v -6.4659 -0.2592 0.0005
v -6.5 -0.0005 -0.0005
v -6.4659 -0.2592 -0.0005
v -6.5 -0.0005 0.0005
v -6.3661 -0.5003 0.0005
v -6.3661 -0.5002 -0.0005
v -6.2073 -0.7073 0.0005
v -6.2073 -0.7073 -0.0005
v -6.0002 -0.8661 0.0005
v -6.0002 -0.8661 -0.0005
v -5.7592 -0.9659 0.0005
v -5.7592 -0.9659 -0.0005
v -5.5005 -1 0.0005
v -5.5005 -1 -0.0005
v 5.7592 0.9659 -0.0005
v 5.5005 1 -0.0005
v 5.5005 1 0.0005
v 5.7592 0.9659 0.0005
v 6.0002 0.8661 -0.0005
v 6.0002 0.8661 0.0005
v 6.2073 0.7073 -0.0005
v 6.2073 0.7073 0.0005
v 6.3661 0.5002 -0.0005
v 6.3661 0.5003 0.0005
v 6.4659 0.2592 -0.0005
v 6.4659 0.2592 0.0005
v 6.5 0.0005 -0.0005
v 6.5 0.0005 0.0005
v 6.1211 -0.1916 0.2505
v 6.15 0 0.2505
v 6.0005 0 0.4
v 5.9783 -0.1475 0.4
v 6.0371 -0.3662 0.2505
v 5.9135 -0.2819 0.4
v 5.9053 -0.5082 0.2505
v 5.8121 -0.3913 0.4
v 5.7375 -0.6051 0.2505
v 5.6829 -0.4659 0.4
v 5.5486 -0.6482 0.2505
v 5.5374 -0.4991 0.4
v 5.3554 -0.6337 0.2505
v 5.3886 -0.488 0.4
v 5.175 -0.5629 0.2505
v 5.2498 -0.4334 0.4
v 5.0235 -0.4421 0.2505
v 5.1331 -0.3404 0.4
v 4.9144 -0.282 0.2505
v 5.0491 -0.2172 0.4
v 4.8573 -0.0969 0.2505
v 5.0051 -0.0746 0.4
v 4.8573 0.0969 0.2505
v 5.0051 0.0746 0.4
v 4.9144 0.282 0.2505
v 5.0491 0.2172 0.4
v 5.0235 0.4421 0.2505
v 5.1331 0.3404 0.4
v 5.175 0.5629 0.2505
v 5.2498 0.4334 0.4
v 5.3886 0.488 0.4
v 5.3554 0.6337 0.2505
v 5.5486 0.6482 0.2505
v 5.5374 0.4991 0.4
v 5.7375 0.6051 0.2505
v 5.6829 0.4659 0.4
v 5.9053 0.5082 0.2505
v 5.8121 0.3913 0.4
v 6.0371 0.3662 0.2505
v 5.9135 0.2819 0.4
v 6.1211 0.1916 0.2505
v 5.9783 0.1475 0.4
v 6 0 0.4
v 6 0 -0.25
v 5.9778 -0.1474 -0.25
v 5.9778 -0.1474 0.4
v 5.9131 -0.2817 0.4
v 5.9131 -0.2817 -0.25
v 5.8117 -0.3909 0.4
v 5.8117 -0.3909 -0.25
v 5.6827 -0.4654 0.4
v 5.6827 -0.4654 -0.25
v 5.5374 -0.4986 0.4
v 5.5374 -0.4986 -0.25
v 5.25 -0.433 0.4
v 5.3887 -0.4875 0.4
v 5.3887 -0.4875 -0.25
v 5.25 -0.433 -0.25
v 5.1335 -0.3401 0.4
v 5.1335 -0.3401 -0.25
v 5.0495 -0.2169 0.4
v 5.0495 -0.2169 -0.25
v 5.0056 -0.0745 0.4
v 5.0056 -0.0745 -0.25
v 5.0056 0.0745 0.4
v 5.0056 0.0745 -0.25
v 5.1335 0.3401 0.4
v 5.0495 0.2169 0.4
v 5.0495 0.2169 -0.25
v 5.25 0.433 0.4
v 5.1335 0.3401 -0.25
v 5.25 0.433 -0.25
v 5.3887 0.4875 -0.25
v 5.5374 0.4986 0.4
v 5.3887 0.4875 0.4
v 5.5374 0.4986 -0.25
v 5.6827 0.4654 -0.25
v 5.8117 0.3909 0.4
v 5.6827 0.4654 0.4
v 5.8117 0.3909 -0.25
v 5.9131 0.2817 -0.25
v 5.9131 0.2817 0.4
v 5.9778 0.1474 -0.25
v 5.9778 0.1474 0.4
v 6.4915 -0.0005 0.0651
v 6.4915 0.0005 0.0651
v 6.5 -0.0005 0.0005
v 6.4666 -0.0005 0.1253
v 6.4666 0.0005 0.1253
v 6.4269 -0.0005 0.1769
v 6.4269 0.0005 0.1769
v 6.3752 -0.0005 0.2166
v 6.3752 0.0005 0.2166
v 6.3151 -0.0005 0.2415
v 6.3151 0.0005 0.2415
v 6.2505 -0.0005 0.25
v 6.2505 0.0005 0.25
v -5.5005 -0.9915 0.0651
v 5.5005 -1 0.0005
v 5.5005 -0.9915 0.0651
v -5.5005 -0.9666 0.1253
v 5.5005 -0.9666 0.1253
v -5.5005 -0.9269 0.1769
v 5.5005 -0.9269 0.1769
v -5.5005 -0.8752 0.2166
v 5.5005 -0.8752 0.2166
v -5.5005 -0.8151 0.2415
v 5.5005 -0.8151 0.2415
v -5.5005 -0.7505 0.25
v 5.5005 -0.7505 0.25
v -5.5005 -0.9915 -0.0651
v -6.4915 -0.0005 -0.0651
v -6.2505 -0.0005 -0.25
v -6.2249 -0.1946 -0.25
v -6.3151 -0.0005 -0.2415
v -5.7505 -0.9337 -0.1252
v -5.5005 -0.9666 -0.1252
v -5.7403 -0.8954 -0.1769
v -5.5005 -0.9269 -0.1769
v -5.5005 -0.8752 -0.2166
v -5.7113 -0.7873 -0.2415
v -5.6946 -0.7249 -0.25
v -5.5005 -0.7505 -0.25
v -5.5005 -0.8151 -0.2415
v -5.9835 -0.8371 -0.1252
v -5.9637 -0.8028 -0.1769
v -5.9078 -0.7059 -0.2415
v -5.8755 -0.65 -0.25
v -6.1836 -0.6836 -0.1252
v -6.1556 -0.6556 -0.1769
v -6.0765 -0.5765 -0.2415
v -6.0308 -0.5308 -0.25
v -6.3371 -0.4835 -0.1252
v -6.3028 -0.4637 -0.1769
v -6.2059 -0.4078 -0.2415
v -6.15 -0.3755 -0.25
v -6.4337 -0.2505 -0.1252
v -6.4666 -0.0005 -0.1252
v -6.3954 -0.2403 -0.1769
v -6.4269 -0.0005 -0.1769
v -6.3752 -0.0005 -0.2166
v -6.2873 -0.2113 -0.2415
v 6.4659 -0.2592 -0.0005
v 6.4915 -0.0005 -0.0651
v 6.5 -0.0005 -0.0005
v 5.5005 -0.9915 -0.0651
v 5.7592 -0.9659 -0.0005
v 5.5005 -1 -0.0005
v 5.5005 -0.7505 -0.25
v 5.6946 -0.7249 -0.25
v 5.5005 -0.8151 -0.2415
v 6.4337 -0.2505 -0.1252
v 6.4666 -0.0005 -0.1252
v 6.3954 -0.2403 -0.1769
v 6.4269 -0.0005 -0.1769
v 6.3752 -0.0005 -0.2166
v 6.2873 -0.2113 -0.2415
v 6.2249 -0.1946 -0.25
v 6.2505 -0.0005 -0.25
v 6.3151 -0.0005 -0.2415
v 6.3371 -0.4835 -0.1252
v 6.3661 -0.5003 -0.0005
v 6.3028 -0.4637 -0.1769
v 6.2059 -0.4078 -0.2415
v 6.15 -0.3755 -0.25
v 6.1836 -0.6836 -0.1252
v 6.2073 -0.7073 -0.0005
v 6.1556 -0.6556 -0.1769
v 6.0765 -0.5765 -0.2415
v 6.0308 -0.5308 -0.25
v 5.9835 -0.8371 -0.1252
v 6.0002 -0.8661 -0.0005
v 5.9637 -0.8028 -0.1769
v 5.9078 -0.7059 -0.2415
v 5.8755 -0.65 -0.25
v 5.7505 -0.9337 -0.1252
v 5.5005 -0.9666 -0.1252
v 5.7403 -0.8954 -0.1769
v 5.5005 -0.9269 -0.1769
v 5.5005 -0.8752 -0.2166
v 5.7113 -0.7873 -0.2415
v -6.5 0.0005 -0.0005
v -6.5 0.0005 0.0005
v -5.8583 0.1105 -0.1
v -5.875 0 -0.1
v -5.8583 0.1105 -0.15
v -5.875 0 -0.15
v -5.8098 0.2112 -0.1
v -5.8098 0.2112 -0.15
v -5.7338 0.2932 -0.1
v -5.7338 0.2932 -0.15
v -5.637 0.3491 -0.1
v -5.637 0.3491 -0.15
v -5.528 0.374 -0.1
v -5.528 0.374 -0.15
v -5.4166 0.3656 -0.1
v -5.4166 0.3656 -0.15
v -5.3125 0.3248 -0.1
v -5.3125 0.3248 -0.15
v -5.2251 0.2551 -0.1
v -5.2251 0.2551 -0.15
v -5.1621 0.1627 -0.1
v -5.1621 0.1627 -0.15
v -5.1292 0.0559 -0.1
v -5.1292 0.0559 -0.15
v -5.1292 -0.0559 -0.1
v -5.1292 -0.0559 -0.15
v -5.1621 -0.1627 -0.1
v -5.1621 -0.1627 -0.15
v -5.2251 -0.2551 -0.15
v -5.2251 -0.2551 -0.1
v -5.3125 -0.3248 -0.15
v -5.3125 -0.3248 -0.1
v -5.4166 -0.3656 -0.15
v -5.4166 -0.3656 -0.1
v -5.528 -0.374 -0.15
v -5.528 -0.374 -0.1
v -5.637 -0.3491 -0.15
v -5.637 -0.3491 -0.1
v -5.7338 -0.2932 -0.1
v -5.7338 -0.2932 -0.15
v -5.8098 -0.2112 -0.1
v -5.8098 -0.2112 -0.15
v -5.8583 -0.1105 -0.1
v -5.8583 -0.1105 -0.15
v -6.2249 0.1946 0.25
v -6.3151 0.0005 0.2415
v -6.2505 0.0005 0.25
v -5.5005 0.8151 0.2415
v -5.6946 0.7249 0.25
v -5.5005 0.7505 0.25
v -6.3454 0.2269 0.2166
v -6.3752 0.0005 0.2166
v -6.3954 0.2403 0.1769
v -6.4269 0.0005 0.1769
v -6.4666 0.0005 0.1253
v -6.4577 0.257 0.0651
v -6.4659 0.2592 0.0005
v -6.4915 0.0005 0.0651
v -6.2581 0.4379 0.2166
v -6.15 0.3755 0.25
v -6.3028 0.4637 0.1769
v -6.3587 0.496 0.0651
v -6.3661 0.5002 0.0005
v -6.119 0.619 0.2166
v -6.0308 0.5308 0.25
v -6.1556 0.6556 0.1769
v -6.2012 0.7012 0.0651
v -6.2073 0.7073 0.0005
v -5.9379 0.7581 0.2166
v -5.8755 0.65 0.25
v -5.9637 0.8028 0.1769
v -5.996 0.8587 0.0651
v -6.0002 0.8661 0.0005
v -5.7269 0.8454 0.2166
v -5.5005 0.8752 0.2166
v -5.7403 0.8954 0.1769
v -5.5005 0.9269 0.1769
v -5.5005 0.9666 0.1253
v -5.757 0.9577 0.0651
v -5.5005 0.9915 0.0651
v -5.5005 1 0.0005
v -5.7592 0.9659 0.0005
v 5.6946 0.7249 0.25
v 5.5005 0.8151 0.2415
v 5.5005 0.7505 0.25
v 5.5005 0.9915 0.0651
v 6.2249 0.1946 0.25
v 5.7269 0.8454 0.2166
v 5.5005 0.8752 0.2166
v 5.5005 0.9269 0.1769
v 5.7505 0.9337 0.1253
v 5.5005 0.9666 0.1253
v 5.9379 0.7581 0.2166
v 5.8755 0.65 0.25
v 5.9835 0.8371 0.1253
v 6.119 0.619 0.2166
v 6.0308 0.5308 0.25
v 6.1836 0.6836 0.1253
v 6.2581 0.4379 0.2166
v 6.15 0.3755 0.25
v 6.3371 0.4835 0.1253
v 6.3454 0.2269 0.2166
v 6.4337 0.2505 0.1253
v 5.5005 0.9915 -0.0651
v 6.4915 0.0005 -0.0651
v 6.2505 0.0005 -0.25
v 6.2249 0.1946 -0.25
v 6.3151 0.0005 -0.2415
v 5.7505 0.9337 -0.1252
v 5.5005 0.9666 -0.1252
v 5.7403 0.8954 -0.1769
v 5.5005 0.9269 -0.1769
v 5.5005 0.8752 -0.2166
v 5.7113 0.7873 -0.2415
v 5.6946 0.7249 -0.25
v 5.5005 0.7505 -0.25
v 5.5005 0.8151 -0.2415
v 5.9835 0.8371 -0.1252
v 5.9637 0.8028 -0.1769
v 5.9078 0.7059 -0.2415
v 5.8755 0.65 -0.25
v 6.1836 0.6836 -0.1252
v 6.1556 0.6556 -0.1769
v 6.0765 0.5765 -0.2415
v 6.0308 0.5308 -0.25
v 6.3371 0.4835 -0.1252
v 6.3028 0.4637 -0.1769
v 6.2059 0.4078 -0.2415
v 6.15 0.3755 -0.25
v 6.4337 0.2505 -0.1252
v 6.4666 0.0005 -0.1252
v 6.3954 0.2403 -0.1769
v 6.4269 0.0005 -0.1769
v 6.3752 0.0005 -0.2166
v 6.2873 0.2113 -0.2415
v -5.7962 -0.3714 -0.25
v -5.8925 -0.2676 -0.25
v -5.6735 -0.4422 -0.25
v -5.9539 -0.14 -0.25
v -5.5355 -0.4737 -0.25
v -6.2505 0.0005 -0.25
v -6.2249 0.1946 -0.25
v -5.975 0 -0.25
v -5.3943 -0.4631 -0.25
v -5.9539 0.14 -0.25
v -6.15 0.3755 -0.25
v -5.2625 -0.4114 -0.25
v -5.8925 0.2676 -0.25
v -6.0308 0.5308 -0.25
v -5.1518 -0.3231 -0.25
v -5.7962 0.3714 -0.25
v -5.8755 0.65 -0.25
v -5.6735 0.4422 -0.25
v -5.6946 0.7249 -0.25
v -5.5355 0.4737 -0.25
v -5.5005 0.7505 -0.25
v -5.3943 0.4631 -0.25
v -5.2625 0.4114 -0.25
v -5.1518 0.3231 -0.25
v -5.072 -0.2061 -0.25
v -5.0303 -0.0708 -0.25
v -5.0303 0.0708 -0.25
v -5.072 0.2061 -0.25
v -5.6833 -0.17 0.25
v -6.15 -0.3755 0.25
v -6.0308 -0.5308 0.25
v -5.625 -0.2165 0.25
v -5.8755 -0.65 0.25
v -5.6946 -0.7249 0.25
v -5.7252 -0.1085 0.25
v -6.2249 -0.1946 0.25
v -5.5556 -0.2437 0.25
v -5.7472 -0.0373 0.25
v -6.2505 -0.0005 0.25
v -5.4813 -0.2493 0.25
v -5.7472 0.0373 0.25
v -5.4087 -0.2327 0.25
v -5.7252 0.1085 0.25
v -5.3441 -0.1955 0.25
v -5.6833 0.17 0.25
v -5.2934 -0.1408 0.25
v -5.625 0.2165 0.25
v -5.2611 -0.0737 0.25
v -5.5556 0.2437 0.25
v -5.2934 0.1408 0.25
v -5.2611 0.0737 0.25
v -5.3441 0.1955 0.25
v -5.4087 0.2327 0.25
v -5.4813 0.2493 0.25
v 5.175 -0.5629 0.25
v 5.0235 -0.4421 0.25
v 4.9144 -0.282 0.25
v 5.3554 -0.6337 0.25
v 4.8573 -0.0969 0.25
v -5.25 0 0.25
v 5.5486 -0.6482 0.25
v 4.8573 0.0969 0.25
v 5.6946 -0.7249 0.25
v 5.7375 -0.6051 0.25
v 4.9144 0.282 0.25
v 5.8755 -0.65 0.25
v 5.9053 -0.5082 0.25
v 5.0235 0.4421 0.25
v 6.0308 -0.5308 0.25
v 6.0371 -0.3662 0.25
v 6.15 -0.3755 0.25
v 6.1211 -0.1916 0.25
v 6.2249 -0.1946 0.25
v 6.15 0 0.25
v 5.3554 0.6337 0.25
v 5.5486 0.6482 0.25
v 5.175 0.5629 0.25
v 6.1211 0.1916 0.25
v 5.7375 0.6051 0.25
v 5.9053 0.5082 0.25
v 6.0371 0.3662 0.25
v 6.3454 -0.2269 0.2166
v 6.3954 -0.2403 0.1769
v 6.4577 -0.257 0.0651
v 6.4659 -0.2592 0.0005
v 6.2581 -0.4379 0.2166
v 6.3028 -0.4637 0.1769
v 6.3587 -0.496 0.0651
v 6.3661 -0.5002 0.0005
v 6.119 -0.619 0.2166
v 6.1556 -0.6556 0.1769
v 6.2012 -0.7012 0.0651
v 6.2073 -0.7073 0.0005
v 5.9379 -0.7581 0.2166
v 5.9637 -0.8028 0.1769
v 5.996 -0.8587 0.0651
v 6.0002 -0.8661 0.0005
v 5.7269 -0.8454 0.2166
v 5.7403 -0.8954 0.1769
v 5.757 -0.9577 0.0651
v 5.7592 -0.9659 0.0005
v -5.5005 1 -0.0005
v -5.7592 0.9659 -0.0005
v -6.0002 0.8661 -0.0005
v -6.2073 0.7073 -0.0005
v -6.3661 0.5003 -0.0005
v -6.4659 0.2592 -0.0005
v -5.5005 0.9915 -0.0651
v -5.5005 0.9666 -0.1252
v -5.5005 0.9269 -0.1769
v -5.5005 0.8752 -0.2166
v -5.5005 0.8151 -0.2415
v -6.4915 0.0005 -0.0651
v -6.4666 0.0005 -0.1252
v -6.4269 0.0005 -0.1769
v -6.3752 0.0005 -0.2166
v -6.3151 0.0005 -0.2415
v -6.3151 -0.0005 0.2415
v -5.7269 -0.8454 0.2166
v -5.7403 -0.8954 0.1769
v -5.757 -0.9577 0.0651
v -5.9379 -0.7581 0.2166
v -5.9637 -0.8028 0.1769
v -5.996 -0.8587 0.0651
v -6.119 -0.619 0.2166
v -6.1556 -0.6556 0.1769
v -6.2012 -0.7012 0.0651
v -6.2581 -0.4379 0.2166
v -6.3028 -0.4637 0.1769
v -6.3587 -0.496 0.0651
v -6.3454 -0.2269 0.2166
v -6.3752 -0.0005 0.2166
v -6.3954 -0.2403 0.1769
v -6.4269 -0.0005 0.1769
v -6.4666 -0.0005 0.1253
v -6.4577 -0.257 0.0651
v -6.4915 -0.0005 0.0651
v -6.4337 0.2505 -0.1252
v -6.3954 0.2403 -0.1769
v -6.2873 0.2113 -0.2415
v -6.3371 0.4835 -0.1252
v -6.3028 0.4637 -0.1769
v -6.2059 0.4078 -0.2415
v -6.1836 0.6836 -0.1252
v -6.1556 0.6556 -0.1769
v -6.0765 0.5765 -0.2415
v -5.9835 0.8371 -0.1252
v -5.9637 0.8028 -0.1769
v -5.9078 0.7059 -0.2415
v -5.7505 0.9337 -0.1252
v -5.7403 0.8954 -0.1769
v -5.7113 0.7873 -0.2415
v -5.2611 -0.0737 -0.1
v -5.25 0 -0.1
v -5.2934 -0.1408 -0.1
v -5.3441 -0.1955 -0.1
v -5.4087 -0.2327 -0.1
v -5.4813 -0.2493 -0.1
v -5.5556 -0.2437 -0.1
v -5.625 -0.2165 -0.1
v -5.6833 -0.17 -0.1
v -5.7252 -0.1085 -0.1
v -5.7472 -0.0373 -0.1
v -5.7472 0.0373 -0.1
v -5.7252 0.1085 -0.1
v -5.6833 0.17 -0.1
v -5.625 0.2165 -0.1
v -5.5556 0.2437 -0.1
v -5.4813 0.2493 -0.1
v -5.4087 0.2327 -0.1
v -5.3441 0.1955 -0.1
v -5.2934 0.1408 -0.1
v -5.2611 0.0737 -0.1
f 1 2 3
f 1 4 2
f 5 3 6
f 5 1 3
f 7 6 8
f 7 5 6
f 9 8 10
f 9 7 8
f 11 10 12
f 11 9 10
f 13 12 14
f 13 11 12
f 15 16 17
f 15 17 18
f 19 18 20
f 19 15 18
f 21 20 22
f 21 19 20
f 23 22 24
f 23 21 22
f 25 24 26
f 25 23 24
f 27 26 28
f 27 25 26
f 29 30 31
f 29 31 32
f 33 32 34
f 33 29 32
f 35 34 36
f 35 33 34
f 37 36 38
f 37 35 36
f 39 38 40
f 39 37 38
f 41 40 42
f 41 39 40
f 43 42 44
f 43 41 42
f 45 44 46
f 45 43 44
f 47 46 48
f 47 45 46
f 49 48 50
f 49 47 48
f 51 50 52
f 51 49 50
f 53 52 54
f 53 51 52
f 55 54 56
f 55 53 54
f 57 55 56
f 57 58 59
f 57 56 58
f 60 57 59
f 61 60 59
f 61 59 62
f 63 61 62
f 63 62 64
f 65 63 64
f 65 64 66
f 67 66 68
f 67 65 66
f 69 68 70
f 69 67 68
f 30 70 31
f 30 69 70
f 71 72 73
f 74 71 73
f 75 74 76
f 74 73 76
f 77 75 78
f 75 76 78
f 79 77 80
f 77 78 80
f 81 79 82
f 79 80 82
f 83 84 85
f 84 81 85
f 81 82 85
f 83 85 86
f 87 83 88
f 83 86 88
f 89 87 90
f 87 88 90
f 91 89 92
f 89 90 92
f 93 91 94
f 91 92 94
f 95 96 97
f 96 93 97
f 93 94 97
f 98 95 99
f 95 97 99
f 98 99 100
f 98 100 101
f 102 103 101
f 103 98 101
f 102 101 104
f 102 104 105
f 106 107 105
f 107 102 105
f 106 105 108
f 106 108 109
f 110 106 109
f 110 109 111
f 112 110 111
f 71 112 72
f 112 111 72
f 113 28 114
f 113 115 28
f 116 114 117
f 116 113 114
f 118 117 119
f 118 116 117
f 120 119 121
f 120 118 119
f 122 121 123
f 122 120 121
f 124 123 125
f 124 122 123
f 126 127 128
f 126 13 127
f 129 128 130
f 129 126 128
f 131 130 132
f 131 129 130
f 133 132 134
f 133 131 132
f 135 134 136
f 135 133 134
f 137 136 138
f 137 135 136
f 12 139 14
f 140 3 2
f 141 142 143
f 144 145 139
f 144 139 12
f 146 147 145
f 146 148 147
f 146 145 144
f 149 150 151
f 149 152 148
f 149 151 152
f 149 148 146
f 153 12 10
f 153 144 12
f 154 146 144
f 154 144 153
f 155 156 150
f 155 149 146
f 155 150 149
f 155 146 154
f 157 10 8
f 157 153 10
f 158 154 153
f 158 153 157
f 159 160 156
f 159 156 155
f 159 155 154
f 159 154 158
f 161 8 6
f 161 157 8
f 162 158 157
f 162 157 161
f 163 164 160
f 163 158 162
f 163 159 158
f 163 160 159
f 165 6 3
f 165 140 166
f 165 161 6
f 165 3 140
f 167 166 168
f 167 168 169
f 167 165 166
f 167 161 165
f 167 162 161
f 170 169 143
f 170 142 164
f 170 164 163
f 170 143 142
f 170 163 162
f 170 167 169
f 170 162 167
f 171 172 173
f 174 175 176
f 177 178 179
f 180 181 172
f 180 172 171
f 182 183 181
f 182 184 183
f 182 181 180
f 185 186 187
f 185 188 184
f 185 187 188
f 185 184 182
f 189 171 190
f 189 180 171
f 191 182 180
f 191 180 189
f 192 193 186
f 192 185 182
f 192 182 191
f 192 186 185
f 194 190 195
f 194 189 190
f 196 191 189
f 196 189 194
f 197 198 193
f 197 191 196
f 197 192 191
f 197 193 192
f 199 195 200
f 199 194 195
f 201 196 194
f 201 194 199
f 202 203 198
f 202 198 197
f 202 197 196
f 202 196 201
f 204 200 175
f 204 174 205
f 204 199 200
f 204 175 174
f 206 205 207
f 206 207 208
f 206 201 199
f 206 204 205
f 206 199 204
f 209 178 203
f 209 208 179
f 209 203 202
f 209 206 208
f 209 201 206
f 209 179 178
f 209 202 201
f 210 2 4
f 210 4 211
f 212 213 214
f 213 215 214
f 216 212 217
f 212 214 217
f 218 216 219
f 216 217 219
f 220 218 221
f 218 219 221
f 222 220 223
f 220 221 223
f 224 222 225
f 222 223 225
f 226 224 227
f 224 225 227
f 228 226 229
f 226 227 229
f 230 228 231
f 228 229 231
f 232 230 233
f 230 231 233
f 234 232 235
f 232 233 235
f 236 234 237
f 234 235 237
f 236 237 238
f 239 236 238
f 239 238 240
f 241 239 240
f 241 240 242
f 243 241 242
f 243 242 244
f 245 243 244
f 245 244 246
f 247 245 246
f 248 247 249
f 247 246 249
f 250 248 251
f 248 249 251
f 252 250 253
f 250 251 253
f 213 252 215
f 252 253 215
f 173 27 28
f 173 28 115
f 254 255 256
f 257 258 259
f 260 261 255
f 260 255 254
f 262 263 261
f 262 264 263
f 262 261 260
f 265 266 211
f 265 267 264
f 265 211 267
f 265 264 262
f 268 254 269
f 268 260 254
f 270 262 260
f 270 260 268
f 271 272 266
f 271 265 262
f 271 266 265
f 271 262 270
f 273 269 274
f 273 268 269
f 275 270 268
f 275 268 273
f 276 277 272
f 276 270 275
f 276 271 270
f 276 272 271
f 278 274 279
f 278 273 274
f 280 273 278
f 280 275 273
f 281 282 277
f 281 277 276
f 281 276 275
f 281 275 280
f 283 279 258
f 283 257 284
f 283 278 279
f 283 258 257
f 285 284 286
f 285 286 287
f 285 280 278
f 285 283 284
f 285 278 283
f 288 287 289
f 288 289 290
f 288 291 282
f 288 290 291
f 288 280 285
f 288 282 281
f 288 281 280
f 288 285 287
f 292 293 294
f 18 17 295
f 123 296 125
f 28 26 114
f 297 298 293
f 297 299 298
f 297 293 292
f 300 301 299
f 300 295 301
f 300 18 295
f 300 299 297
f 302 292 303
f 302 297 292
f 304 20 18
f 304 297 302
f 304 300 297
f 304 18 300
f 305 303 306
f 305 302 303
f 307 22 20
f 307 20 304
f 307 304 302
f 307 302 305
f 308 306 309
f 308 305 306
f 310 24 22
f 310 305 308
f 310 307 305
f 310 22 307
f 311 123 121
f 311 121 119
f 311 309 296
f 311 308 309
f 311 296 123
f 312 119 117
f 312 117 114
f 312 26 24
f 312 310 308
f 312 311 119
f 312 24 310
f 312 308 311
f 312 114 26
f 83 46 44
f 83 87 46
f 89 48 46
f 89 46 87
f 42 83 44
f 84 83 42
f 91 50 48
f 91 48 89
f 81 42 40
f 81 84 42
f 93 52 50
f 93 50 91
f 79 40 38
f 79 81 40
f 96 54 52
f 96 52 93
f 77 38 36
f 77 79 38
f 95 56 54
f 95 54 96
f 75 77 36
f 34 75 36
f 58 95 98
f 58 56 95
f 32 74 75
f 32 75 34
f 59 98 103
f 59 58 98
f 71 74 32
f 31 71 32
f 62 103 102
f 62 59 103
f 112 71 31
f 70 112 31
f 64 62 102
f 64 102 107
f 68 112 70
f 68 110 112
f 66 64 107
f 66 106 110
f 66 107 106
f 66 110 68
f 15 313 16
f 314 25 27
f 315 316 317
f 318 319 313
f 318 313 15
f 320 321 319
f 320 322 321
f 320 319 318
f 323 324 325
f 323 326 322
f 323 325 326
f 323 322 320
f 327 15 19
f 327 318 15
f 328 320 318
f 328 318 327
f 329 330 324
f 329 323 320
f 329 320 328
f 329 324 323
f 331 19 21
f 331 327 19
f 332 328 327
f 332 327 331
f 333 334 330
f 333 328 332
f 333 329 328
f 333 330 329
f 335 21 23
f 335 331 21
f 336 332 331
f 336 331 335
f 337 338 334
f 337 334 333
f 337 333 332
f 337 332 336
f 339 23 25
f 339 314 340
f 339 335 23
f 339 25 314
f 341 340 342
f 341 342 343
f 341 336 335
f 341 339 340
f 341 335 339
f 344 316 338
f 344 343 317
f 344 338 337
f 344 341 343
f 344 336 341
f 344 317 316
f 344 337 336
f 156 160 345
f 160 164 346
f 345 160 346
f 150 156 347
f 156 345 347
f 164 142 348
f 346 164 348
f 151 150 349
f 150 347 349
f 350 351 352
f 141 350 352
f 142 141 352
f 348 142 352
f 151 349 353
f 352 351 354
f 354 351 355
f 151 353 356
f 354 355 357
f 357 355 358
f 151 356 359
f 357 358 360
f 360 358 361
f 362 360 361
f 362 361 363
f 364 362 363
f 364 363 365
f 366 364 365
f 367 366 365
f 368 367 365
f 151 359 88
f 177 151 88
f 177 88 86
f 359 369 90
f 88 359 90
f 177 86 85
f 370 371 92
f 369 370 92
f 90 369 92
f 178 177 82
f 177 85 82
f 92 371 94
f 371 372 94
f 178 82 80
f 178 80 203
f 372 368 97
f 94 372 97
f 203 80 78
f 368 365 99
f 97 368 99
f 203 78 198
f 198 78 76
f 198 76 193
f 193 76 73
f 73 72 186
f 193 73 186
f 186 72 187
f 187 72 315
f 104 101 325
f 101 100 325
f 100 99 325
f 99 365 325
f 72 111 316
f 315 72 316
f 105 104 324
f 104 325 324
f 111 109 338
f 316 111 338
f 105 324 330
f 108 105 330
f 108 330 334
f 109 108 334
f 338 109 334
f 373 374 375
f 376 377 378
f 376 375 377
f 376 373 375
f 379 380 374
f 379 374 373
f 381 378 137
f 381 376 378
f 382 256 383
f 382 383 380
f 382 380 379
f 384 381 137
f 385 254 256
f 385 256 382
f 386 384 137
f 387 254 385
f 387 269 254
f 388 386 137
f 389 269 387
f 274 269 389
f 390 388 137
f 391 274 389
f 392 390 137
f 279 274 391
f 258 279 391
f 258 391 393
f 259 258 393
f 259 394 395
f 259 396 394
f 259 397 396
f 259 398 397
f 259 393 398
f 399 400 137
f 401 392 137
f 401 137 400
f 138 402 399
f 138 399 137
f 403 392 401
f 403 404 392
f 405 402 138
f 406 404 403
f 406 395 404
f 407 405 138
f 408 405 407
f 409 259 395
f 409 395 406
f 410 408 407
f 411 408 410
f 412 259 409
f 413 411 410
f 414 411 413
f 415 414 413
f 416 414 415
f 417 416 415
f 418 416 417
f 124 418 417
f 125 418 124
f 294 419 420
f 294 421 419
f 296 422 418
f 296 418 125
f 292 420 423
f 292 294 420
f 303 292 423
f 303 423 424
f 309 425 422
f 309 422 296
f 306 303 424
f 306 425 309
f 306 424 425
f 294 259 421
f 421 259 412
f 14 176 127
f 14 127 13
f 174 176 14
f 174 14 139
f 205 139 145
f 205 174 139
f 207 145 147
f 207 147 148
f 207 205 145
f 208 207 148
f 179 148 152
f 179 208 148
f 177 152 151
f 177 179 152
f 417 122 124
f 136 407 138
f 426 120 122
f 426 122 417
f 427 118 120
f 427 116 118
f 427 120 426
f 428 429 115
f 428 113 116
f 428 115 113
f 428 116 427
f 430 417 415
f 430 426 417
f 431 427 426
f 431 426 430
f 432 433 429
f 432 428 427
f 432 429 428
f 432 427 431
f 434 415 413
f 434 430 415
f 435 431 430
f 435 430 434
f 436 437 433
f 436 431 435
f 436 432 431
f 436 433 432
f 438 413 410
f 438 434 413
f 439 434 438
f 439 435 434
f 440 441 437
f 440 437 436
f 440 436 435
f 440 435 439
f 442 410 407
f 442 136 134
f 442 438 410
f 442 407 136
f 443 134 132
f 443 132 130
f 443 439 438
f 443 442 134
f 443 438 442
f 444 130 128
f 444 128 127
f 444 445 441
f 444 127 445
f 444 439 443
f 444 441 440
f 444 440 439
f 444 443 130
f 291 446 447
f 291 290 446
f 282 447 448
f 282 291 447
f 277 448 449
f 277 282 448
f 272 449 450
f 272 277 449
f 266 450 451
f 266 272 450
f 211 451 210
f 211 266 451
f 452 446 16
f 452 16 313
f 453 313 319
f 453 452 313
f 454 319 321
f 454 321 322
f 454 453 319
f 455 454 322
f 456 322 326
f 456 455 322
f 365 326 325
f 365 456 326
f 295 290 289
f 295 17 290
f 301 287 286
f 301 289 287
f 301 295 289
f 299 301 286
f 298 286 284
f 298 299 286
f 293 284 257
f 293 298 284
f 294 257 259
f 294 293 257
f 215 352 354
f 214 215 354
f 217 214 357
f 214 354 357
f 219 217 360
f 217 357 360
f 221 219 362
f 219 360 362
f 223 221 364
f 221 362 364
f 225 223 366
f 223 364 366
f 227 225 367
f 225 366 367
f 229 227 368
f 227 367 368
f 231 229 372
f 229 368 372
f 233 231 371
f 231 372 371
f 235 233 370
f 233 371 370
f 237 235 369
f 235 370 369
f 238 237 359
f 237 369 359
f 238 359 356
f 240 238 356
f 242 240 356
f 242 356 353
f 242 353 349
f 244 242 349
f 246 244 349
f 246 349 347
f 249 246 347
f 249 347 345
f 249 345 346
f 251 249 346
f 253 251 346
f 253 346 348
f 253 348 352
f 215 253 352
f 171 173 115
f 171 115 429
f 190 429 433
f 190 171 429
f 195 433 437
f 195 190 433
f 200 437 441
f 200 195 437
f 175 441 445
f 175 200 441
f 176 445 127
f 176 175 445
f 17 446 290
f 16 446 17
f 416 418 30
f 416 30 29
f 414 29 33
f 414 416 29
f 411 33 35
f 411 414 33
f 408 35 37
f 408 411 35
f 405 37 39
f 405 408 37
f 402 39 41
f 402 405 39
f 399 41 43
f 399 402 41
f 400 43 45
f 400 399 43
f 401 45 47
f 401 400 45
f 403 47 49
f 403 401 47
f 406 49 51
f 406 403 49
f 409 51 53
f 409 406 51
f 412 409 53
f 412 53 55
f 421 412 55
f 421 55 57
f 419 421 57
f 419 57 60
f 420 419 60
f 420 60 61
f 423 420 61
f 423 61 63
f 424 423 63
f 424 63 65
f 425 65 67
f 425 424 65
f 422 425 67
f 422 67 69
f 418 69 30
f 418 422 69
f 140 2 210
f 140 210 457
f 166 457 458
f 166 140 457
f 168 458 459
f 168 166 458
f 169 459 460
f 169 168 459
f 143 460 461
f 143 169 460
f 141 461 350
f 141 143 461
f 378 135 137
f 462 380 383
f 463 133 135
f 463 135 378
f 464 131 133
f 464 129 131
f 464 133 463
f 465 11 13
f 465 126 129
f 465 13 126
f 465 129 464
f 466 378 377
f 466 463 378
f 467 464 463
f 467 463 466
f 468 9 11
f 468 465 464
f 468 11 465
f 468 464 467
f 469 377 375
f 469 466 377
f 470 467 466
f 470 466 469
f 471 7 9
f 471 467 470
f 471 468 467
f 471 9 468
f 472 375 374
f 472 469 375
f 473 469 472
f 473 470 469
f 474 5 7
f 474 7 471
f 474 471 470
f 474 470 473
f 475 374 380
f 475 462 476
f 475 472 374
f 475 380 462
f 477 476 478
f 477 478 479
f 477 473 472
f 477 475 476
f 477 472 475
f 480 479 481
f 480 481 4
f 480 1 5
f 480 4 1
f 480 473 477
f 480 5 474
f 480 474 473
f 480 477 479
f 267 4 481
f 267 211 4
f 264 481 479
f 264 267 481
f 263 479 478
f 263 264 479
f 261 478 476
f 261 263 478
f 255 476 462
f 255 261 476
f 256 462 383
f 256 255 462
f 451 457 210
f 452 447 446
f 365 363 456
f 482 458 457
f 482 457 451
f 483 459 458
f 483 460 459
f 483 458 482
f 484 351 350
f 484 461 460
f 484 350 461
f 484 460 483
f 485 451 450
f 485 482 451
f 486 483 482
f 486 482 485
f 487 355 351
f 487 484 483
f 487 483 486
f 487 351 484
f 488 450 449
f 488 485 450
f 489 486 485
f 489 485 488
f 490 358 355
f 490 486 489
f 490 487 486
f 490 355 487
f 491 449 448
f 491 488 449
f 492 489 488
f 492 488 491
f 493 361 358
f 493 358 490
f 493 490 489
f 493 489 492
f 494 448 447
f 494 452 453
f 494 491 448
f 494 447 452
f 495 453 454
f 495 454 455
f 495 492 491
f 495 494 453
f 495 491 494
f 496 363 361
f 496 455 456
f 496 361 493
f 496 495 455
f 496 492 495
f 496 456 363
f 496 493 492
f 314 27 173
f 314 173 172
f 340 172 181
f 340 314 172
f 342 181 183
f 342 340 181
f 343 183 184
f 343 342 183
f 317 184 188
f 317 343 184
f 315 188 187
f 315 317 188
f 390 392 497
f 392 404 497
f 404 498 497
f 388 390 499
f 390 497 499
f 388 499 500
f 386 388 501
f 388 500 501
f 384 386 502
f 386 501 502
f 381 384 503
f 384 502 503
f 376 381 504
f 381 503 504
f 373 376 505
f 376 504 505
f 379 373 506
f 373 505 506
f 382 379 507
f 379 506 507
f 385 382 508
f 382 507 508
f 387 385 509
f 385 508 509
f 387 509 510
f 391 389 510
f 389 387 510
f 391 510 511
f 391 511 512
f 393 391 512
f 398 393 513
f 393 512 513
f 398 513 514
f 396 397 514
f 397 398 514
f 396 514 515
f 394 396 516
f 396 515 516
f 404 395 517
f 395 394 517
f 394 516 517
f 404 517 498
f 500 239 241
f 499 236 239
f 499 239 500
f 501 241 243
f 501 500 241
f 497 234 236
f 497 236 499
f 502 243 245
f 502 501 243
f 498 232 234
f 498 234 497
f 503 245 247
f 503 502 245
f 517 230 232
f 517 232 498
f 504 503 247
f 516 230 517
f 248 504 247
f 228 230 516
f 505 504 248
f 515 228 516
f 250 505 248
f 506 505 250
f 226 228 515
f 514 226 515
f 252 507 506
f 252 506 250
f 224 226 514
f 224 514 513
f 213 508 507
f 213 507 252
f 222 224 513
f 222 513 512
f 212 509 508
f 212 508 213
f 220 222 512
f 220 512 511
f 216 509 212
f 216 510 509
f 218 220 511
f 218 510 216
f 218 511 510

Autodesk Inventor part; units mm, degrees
ref_plane "YZ Plane" through (0, 0, 0) normal (1, 0, 0) x (0, 1, 0)
ref_plane "XZ Plane" through (0, 0, 0) normal (0, 1, 0) x (-1, 0, 0)
ref_plane "XY Plane" through (0, 0, 0) normal (0, 0, 1) x (1, 0, 0)
sketch "Sketch1" plane through (0, 0, 0) normal (0, 0, 1) x (1, 0, 0)
  line L0 (-6.5, 1) -> (6.5, 1)
  line L1 (6.5, 1) -> (6.5, -1)
  line L2 (6.5, -1) -> (-6.5, -1)
  line L3 (-6.5, -1) -> (-6.5, 1)
  circle A0 centre (-5.5, 0) radius 0.25
  circle A1 centre (5.5, 0) radius 0.5
  point P0 (0, 0)
  point P1 (0, 1)
  point P2 (-6.5, 0)
  dimension "d0" = 2
  dimension "d1" = 0.5
  dimension "d2" = 1
  dimension "d7" = 13
  dimension "d8" = 1
  dimension "d12" = 1
extrude "Extrusion1" add sketch "Sketch1" along normal mid plane 0.5
fillet "Fillet1" radius 1 4 edges at (6.5, 1, 0) (6.5, -1, 0) (-6.5, 1, 0) (-6.5, -1, 0)
sketch "Sketch3" plane through (0, 0, 0.25) normal (0, 0, 1) x (1, 0, 0)
  circle A0 centre (5.5, 0) radius 0.5 projected
  circle A1 centre (5.5, 0) radius 0.65
  point P0 (0, 0)
  dimension "d13" = 1.3
extrude "Extrusion2" add sketch "Sketch3" along normal blind 0.15
chamfer "Chamfer1" distance 0.15 angle 45 1 edges at (4.85, 0, 0.4)
fillet "Fillet2" radius 0.25 8 edges at (-6.2073, 0.7073, -0.25) (0, 1, -0.25) (6.2073, 0.7073, -0.25) (0, -1, -0.25) (6.2073, 0.7073, 0.25) (0, 1, 0.25) (-6.2073, 0.7073, 0.25) (0, -1, 0.25)
sketch "Sketch4" plane through (0, 0, -0.25) normal (0, 0, -1) x (-1, 0, 0)
  circle A0 centre (5.5, 0) radius 0.25 projected
  circle A1 centre (5.5, 0) radius 0.375
  point P0 (0, 0)
  dimension "d20" = 0.75
extrude "Extrusion3" cut sketch "Sketch4" against normal blind 0.15
chamfer "Chamfer3" distance 0.1 angle 45 1 edges at (-5.125, 0, -0.25)
properties part number "Link_2"
